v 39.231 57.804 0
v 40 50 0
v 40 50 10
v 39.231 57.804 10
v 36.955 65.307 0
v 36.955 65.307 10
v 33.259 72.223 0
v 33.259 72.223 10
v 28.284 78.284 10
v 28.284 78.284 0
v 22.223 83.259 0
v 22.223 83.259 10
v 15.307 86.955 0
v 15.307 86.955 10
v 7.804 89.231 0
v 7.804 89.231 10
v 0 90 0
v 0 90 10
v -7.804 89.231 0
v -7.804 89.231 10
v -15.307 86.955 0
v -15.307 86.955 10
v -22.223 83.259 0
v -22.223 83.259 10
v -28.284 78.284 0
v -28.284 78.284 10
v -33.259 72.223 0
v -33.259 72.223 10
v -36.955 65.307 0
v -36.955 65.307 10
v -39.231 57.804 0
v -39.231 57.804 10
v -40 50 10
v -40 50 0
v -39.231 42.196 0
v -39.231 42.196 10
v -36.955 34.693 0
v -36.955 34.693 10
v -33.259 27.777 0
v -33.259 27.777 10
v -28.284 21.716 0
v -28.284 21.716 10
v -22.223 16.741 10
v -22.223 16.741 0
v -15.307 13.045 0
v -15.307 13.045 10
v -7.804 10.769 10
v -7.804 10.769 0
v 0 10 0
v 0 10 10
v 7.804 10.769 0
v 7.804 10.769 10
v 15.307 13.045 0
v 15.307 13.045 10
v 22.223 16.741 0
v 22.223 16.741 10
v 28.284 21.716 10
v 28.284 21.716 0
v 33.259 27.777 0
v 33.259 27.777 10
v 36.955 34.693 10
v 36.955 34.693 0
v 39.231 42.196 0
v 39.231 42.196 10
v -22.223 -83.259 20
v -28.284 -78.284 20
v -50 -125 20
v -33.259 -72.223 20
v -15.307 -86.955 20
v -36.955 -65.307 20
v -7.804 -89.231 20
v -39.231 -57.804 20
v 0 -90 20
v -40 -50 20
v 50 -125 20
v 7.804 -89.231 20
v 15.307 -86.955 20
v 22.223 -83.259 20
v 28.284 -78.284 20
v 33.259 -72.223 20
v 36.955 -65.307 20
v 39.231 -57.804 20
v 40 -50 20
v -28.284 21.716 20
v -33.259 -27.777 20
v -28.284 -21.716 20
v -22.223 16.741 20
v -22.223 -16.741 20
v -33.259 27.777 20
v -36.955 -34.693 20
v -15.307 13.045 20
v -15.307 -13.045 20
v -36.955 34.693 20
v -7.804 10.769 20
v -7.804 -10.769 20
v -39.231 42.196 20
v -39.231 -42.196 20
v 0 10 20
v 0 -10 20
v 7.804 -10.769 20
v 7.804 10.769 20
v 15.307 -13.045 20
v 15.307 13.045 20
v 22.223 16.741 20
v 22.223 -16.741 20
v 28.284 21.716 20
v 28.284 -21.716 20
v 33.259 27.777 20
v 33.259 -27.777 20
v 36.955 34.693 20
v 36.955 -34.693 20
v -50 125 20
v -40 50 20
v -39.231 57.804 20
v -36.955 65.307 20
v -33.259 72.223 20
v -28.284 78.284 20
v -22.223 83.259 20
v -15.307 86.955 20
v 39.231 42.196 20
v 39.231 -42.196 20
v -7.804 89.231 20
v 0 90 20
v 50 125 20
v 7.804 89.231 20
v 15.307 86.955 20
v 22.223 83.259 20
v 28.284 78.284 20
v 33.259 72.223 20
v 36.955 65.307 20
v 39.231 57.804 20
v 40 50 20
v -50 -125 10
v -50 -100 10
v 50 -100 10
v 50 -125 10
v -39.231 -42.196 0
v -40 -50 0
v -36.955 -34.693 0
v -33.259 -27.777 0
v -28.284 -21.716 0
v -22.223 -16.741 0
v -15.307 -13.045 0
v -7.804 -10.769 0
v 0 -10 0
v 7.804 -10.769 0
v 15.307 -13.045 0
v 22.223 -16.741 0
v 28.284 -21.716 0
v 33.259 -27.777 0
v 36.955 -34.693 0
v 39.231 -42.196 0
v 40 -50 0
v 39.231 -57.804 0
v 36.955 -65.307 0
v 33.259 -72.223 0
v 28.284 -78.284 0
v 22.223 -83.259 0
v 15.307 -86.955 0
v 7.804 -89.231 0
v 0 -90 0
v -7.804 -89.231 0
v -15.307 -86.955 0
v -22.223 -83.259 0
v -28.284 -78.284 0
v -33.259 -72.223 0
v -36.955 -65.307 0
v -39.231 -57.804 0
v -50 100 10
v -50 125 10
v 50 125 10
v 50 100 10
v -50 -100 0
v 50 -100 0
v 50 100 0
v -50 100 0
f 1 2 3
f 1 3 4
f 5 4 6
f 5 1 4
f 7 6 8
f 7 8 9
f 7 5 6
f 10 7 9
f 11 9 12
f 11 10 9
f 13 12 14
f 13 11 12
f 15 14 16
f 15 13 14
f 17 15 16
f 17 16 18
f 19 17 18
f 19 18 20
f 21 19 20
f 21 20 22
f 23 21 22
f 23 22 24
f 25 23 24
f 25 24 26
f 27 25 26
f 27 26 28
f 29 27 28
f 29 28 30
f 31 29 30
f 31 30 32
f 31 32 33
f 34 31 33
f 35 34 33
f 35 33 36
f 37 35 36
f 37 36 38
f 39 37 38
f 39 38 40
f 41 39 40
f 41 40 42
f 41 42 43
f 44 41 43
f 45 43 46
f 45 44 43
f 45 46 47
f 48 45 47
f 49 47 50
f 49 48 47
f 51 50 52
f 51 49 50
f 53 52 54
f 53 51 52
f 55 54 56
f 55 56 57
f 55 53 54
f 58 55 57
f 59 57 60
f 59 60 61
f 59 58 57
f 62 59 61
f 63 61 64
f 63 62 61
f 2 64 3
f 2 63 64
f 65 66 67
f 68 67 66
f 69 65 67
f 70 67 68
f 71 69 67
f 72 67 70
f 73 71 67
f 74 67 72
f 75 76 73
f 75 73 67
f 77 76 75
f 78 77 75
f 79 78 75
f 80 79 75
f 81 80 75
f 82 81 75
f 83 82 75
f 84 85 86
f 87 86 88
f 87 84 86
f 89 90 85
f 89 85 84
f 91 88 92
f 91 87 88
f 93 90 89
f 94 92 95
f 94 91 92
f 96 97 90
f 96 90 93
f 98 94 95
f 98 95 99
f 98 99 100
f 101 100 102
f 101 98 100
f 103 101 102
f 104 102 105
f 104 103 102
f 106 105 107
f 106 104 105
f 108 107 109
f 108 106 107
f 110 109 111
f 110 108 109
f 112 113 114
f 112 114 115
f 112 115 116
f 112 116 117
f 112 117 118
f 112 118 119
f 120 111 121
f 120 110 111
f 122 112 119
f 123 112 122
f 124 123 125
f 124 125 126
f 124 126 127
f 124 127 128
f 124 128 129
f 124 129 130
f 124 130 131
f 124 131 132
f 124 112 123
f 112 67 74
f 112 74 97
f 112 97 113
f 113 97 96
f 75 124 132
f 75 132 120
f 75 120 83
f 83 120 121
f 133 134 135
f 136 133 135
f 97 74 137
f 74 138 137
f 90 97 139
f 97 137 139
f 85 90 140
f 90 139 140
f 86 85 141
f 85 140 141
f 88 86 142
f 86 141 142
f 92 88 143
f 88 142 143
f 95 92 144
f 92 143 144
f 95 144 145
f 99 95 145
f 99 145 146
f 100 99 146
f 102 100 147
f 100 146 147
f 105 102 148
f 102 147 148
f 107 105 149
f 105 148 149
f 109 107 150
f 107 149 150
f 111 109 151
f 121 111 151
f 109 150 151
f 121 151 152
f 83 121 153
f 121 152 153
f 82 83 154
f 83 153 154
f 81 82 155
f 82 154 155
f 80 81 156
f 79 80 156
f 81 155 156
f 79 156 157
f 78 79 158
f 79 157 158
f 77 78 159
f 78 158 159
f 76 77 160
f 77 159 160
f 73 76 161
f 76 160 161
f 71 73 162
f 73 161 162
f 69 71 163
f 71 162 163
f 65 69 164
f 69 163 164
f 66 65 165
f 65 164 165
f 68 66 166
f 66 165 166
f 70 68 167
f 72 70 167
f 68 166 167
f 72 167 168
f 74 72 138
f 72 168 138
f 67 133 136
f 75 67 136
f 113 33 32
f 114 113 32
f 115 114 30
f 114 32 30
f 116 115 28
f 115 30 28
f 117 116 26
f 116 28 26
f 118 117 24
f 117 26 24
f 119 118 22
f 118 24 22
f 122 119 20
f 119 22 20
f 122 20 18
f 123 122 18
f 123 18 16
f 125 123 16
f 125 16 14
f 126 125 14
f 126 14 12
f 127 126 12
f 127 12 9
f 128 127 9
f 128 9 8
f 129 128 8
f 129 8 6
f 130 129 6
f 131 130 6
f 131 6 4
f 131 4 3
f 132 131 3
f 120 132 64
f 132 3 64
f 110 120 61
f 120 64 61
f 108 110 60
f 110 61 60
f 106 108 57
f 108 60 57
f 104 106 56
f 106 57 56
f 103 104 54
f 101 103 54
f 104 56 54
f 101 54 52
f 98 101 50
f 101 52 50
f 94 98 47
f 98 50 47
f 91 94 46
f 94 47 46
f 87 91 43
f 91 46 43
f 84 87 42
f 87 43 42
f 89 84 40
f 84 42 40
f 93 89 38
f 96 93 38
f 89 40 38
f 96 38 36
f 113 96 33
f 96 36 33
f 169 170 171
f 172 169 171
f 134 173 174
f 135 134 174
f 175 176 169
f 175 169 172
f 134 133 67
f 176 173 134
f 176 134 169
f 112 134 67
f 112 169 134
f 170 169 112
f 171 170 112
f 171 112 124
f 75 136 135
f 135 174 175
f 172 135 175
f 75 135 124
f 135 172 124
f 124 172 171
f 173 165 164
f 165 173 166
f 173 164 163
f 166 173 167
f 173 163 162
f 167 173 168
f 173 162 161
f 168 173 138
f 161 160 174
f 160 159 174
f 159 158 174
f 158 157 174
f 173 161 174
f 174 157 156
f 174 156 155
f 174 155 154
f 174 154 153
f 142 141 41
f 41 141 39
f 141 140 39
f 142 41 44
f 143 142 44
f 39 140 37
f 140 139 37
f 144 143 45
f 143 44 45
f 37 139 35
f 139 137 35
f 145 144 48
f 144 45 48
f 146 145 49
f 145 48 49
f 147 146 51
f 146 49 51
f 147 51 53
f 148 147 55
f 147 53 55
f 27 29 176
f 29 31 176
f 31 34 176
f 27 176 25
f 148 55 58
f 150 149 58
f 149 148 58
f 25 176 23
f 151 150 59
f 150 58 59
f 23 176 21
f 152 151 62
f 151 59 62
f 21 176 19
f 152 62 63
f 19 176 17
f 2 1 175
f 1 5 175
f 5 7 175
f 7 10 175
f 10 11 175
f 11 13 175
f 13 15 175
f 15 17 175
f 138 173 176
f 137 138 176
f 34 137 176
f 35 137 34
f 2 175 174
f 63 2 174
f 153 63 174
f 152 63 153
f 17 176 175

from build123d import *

# Parameters (mm, degrees)
SKETCH_1_W          = 100
SKETCH_1_H          = 200
SKETCH_1_R          = 40
EXTRUDE_1_DEPTH     = 10
SKETCH_2_W          = 100
SKETCH_2_H          = 250
EXTRUDE_2_DEPTH     = 10
SKETCH_3_R          = 40
CUT_EXTRUDE_1_DEPTH = 136


with BuildPart() as part:
    # 草图1 → 凸台-拉伸1 (new body)
    with BuildSketch(Plane.XY):
        Rectangle(SKETCH_1_W, SKETCH_1_H)
        with Locations((0, 50)):
            Circle(SKETCH_1_R, mode=Mode.SUBTRACT)
        with Locations(Location((0, -50, 0), (0, 0, 180))):
            Circle(SKETCH_1_R, mode=Mode.SUBTRACT)
    extrude(amount=EXTRUDE_1_DEPTH)

    # 草图2 → 凸台-拉伸2 (add)
    with BuildSketch(Plane.XY.offset(10)):
        Rectangle(SKETCH_2_W, SKETCH_2_H)
    extrude(amount=EXTRUDE_2_DEPTH)

    # 草图3 → 切除-拉伸1 (cut, through all)
    with BuildSketch(Plane(origin=(0, 0, 10), x_dir=(-1, 0, 0), z_dir=(0, 0, -1))):
        with Locations((0, 50)):
            Circle(SKETCH_3_R)
        with Locations((0, -50)):
            Circle(SKETCH_3_R)
    extrude(amount=-CUT_EXTRUDE_1_DEPTH, mode=Mode.SUBTRACT)


solid = part.part
